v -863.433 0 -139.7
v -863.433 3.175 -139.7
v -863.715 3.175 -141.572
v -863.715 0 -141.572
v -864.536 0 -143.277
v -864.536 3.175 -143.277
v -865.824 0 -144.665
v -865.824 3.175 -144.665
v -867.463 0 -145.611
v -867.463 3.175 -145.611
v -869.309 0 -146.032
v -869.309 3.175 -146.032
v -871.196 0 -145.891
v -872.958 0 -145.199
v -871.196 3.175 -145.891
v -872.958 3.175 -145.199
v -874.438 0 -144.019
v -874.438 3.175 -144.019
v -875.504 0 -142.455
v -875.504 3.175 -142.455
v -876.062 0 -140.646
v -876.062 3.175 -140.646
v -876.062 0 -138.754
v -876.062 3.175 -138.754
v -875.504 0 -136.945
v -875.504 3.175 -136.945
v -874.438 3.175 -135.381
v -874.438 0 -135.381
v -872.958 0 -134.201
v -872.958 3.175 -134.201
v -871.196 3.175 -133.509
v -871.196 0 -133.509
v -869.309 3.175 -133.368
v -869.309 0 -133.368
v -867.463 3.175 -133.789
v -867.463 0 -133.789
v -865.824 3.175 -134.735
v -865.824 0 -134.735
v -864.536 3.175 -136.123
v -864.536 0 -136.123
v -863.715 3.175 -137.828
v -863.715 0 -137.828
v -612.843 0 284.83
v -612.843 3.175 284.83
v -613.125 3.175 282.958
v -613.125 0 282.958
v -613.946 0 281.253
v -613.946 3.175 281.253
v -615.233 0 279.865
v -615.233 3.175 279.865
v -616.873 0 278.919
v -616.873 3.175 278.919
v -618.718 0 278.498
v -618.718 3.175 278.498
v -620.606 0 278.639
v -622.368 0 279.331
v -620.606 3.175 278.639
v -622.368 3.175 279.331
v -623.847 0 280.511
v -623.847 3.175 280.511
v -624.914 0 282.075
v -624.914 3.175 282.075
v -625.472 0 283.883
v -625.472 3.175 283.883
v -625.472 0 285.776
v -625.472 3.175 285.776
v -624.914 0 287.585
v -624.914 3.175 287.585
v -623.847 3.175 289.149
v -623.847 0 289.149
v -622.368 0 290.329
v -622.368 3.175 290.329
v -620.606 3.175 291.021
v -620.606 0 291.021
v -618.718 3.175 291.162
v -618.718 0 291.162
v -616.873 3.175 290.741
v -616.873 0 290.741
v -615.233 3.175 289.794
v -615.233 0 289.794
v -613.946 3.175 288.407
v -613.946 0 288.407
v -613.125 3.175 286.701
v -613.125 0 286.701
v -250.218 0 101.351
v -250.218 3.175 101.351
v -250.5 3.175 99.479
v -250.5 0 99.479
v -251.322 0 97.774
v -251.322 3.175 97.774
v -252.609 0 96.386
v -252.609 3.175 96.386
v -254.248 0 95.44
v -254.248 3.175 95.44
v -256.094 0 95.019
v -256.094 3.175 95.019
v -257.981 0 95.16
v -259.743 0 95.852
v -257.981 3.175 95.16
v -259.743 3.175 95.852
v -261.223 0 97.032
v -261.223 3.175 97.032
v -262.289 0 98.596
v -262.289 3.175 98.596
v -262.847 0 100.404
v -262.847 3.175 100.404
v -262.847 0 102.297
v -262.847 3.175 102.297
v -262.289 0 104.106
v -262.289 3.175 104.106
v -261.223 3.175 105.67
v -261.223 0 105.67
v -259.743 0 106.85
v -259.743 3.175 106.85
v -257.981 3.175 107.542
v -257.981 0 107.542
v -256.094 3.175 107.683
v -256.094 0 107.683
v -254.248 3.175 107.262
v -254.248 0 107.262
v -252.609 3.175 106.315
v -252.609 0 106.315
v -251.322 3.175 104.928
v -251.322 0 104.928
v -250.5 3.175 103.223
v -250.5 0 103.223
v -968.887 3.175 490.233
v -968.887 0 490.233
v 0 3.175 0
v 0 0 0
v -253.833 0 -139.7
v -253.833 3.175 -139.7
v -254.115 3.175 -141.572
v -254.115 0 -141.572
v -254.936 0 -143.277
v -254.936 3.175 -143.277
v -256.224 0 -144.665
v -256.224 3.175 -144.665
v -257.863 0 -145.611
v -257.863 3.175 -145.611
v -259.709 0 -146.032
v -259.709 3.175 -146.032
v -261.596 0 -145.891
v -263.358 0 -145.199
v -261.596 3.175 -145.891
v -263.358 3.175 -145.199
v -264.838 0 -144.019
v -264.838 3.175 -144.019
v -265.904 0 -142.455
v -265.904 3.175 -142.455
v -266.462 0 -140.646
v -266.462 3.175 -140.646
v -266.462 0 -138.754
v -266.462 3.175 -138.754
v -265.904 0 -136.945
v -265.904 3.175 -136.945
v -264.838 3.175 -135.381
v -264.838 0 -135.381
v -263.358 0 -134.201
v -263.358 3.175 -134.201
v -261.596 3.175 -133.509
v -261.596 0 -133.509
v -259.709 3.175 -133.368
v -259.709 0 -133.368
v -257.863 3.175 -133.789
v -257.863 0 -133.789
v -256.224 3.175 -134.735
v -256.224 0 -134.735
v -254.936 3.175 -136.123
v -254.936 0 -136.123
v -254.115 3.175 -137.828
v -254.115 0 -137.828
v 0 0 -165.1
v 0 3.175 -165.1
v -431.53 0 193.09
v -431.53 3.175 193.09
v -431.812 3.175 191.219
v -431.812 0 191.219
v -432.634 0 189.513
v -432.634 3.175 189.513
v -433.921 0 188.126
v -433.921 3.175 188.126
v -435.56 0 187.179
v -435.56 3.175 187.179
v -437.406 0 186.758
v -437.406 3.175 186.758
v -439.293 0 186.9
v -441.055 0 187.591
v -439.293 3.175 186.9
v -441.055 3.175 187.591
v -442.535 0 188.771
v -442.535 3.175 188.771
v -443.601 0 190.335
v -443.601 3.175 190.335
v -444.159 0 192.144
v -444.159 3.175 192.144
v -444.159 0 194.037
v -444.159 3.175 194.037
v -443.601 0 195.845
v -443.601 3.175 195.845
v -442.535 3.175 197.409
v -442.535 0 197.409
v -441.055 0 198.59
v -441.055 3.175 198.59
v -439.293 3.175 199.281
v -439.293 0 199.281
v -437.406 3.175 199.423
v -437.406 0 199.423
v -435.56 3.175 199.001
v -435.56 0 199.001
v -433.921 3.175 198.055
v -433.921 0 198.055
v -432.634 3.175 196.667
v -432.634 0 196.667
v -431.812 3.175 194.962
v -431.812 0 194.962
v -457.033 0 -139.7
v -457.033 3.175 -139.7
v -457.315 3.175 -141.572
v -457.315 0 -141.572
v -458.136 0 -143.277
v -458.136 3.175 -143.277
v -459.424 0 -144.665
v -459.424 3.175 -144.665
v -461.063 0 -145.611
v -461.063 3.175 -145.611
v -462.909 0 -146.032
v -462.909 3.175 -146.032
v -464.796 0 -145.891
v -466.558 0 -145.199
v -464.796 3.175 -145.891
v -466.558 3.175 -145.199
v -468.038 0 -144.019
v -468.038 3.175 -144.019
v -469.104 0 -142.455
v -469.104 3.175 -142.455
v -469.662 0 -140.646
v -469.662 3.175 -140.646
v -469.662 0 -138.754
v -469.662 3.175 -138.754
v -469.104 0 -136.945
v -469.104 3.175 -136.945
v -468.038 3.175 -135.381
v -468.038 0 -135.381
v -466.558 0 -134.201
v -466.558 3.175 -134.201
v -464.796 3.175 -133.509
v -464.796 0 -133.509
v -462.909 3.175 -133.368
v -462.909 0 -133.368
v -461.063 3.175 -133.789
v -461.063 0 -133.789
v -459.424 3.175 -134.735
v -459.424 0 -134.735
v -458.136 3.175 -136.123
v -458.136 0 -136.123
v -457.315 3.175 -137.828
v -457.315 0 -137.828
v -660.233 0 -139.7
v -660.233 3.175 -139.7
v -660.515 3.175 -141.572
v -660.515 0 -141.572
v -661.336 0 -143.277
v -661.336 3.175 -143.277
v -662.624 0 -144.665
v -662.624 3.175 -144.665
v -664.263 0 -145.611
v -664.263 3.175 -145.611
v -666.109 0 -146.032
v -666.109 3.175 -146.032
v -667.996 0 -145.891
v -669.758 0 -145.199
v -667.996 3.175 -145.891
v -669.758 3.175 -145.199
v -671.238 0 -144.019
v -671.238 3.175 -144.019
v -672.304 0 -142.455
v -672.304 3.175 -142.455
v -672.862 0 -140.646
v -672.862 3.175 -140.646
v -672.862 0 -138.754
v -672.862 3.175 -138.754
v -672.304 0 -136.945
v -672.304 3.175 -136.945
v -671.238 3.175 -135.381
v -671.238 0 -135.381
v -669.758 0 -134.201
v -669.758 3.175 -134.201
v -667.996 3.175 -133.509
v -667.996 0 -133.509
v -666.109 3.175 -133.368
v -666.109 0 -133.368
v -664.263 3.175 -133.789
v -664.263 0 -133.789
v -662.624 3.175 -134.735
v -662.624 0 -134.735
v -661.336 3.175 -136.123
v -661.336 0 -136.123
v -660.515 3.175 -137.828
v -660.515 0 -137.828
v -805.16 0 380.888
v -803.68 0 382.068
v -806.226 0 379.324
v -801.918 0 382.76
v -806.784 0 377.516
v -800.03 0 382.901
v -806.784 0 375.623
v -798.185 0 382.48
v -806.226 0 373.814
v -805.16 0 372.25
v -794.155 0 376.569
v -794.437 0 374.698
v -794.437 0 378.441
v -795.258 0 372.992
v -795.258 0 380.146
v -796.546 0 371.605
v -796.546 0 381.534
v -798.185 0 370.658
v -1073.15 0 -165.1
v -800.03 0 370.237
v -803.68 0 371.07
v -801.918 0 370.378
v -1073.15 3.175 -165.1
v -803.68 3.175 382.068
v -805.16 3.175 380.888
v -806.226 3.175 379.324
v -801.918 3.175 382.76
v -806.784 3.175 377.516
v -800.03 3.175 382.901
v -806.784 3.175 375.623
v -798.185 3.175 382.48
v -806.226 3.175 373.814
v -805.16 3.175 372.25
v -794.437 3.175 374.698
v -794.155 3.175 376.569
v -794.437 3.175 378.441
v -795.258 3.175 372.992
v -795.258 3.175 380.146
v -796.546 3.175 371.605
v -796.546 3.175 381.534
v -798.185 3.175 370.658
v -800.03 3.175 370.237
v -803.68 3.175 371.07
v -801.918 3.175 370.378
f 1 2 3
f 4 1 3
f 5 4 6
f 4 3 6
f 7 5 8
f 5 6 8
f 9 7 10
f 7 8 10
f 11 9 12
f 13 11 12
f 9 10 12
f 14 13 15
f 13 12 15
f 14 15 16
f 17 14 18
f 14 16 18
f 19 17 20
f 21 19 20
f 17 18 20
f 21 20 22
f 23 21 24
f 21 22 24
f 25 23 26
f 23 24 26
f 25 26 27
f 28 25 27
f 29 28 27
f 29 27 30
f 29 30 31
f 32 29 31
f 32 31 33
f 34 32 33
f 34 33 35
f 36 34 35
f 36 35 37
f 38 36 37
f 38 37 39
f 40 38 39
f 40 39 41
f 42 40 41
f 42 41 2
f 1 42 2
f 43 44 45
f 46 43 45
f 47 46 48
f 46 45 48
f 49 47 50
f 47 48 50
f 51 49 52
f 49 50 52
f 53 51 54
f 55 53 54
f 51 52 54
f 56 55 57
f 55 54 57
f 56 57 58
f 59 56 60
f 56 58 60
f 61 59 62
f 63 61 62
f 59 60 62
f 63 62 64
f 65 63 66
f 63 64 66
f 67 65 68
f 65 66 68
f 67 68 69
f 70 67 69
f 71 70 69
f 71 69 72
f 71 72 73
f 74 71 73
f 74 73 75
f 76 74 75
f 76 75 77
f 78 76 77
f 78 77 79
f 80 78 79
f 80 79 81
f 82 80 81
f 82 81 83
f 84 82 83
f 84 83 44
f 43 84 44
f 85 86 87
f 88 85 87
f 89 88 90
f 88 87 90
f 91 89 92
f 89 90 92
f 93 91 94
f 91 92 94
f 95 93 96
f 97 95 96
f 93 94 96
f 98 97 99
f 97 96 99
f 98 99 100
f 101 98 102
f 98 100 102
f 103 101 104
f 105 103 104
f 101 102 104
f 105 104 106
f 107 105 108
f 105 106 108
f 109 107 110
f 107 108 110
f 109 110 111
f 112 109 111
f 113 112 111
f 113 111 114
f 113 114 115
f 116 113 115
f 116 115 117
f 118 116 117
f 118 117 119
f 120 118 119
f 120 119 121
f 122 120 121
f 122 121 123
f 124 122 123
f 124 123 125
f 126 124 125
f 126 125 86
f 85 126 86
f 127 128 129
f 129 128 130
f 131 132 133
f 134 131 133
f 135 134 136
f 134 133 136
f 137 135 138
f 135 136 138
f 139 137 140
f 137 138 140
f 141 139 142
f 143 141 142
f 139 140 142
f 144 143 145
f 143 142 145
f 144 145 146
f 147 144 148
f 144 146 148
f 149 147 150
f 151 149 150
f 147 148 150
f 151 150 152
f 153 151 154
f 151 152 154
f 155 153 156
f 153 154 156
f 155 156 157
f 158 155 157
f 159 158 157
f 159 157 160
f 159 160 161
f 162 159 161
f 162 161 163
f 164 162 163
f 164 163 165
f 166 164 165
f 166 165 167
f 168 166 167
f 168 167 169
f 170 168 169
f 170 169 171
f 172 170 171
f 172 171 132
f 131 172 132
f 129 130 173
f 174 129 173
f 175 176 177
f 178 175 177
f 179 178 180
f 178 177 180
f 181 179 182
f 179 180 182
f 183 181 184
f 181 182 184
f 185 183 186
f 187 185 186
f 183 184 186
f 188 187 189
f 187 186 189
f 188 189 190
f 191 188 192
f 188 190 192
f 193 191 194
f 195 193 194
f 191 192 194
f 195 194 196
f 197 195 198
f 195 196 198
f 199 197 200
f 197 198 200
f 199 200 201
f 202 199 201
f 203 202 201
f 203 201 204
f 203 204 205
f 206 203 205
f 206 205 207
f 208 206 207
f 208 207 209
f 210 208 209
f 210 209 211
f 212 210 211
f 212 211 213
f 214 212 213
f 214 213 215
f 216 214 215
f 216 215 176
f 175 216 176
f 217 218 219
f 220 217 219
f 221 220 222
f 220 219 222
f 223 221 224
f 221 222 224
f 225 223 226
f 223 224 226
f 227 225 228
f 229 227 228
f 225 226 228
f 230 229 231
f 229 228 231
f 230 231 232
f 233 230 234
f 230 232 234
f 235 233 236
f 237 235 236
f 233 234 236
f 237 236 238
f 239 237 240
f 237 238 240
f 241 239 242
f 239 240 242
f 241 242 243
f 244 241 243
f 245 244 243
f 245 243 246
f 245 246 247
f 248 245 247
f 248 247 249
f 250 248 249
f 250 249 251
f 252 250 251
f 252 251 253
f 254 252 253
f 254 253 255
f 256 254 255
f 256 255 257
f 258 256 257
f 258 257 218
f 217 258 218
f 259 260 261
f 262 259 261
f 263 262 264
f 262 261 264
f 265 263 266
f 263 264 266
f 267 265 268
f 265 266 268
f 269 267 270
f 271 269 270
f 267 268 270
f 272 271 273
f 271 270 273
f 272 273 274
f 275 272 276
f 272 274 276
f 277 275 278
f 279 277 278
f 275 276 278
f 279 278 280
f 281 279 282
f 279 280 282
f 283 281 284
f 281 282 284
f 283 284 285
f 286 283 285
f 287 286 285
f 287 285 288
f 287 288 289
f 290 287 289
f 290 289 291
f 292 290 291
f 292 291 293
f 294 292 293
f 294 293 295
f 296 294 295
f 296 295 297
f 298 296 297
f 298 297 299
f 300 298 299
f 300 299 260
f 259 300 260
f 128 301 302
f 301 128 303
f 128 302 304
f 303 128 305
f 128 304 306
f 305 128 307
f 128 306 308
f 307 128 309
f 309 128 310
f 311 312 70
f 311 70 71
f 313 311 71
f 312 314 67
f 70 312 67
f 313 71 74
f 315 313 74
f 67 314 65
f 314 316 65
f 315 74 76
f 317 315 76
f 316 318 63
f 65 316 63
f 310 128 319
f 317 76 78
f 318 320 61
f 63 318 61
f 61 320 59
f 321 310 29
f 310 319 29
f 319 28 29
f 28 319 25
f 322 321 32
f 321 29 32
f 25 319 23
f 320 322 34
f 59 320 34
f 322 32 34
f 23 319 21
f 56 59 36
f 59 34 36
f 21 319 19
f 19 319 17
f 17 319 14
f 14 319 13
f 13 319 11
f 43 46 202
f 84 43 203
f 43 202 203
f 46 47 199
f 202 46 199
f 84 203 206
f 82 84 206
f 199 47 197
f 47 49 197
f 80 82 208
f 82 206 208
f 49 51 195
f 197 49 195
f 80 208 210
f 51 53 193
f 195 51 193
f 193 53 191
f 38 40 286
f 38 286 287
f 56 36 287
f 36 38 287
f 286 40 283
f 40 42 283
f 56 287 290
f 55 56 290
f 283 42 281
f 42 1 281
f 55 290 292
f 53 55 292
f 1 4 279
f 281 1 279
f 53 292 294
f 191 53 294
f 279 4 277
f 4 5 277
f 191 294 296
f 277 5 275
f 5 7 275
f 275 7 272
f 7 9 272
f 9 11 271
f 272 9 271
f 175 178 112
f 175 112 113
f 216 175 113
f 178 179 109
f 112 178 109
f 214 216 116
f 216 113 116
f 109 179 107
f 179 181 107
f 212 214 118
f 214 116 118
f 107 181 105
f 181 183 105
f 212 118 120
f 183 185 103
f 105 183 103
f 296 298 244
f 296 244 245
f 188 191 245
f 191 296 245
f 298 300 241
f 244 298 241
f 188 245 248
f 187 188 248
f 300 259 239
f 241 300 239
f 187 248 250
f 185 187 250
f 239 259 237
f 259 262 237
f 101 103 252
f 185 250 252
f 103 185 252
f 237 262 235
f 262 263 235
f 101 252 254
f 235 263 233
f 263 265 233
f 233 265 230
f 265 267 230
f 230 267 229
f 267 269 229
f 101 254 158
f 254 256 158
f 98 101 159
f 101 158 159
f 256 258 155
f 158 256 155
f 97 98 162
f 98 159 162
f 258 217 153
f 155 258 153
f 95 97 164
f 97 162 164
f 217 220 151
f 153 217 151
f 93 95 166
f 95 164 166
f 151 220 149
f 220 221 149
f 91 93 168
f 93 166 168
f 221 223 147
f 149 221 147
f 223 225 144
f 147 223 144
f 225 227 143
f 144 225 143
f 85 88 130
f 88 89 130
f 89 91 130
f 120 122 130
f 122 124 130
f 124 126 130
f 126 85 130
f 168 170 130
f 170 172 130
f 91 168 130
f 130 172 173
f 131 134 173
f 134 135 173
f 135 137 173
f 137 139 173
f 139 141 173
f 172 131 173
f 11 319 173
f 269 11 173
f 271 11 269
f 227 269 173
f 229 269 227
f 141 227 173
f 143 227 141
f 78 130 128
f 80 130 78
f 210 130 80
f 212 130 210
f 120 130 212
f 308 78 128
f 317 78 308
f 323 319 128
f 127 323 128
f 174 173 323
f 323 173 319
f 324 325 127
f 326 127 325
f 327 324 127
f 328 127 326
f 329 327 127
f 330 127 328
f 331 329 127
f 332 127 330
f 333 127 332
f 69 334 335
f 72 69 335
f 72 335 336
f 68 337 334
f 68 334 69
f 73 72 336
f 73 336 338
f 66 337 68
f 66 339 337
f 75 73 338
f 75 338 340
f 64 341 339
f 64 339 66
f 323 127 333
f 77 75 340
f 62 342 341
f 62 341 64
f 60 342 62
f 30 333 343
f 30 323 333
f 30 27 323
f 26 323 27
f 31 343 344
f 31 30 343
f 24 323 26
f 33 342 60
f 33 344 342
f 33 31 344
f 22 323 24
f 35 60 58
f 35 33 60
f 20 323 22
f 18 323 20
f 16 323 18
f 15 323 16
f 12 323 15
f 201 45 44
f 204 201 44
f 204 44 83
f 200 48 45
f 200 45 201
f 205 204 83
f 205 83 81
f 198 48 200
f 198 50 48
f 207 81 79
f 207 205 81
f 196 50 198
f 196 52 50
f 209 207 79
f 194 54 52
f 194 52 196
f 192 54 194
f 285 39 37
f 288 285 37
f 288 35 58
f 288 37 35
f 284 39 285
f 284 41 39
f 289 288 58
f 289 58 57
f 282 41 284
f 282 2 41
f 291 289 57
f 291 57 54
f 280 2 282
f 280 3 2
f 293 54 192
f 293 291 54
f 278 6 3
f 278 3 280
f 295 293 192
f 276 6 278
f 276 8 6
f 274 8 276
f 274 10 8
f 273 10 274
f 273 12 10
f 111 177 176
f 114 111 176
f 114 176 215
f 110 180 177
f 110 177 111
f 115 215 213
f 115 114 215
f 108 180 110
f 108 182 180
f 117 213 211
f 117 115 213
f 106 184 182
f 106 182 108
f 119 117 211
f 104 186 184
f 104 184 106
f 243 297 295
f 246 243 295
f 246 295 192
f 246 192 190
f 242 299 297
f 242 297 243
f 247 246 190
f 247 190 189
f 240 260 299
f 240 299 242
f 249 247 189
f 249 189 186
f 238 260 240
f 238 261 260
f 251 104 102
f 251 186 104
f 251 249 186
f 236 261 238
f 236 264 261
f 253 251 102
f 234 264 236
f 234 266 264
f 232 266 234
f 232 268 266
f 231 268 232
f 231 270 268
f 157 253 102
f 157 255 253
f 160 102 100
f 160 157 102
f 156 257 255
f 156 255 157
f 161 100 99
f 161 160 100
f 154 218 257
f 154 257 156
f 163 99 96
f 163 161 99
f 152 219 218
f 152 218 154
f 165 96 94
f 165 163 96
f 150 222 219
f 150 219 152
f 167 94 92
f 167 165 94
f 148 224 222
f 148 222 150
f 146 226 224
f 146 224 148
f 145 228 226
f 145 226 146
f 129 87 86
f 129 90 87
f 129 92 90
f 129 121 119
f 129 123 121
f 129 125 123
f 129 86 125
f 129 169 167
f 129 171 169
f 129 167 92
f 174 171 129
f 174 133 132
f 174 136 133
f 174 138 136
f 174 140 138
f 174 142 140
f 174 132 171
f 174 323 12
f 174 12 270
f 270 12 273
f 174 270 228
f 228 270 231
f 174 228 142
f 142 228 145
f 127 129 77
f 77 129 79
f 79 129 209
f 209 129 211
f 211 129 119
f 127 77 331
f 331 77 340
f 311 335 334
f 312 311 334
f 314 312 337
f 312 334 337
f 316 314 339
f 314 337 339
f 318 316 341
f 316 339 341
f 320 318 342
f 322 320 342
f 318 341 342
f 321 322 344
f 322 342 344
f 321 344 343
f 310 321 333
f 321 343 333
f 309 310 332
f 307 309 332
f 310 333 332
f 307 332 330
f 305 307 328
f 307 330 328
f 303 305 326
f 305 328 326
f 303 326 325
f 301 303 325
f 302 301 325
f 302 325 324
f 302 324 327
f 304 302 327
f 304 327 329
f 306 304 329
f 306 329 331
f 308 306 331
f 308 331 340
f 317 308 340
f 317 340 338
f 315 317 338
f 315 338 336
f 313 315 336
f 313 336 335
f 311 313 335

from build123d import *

# Parameters (mm, degrees)
BOSS_EXTRUDE1_DEPTH = 3.175
SKETCH3_R           = 6.35
CUT_EXTRUDE1_DEPTH  = 4.175


with BuildPart() as part:
    # Sketch1 → Boss-Extrude1 (new body)
    with BuildSketch(Plane(origin=(0, 0, 0), x_dir=(1, 0, 0), z_dir=(0, 1, 0))):
        Polygon((0, 0), (0, 165.1), (-1073.15, 165.1), (-968.887028118, -490.232750074), align=None)
    extrude(amount=BOSS_EXTRUDE1_DEPTH)

    # Sketch3 → Cut-Extrude1 (cut, through all)
    with BuildSketch(Plane(origin=(0, 3.175, 0), x_dir=(1, 0, 0), z_dir=(0, 1, 0))):
        with Locations((-869.783056686, 139.7)):
            Circle(SKETCH3_R)
        with Locations((-666.583056686, 139.7)):
            Circle(SKETCH3_R)
        with Locations((-463.383056686, 139.7)):
            Circle(SKETCH3_R)
        with Locations((-260.183056686, 139.7)):
            Circle(SKETCH3_R)
        with Locations((-800.504721955, -376.569229128)):
            Circle(SKETCH3_R)
        with Locations((-619.192529558, -284.829767126)):
            Circle(SKETCH3_R)
        with Locations((-437.880337162, -193.090305124)):
            Circle(SKETCH3_R)
        with Locations((-256.568144766, -101.350843122)):
            Circle(SKETCH3_R)
    extrude(amount=-CUT_EXTRUDE1_DEPTH, mode=Mode.SUBTRACT)


solid = part.part
